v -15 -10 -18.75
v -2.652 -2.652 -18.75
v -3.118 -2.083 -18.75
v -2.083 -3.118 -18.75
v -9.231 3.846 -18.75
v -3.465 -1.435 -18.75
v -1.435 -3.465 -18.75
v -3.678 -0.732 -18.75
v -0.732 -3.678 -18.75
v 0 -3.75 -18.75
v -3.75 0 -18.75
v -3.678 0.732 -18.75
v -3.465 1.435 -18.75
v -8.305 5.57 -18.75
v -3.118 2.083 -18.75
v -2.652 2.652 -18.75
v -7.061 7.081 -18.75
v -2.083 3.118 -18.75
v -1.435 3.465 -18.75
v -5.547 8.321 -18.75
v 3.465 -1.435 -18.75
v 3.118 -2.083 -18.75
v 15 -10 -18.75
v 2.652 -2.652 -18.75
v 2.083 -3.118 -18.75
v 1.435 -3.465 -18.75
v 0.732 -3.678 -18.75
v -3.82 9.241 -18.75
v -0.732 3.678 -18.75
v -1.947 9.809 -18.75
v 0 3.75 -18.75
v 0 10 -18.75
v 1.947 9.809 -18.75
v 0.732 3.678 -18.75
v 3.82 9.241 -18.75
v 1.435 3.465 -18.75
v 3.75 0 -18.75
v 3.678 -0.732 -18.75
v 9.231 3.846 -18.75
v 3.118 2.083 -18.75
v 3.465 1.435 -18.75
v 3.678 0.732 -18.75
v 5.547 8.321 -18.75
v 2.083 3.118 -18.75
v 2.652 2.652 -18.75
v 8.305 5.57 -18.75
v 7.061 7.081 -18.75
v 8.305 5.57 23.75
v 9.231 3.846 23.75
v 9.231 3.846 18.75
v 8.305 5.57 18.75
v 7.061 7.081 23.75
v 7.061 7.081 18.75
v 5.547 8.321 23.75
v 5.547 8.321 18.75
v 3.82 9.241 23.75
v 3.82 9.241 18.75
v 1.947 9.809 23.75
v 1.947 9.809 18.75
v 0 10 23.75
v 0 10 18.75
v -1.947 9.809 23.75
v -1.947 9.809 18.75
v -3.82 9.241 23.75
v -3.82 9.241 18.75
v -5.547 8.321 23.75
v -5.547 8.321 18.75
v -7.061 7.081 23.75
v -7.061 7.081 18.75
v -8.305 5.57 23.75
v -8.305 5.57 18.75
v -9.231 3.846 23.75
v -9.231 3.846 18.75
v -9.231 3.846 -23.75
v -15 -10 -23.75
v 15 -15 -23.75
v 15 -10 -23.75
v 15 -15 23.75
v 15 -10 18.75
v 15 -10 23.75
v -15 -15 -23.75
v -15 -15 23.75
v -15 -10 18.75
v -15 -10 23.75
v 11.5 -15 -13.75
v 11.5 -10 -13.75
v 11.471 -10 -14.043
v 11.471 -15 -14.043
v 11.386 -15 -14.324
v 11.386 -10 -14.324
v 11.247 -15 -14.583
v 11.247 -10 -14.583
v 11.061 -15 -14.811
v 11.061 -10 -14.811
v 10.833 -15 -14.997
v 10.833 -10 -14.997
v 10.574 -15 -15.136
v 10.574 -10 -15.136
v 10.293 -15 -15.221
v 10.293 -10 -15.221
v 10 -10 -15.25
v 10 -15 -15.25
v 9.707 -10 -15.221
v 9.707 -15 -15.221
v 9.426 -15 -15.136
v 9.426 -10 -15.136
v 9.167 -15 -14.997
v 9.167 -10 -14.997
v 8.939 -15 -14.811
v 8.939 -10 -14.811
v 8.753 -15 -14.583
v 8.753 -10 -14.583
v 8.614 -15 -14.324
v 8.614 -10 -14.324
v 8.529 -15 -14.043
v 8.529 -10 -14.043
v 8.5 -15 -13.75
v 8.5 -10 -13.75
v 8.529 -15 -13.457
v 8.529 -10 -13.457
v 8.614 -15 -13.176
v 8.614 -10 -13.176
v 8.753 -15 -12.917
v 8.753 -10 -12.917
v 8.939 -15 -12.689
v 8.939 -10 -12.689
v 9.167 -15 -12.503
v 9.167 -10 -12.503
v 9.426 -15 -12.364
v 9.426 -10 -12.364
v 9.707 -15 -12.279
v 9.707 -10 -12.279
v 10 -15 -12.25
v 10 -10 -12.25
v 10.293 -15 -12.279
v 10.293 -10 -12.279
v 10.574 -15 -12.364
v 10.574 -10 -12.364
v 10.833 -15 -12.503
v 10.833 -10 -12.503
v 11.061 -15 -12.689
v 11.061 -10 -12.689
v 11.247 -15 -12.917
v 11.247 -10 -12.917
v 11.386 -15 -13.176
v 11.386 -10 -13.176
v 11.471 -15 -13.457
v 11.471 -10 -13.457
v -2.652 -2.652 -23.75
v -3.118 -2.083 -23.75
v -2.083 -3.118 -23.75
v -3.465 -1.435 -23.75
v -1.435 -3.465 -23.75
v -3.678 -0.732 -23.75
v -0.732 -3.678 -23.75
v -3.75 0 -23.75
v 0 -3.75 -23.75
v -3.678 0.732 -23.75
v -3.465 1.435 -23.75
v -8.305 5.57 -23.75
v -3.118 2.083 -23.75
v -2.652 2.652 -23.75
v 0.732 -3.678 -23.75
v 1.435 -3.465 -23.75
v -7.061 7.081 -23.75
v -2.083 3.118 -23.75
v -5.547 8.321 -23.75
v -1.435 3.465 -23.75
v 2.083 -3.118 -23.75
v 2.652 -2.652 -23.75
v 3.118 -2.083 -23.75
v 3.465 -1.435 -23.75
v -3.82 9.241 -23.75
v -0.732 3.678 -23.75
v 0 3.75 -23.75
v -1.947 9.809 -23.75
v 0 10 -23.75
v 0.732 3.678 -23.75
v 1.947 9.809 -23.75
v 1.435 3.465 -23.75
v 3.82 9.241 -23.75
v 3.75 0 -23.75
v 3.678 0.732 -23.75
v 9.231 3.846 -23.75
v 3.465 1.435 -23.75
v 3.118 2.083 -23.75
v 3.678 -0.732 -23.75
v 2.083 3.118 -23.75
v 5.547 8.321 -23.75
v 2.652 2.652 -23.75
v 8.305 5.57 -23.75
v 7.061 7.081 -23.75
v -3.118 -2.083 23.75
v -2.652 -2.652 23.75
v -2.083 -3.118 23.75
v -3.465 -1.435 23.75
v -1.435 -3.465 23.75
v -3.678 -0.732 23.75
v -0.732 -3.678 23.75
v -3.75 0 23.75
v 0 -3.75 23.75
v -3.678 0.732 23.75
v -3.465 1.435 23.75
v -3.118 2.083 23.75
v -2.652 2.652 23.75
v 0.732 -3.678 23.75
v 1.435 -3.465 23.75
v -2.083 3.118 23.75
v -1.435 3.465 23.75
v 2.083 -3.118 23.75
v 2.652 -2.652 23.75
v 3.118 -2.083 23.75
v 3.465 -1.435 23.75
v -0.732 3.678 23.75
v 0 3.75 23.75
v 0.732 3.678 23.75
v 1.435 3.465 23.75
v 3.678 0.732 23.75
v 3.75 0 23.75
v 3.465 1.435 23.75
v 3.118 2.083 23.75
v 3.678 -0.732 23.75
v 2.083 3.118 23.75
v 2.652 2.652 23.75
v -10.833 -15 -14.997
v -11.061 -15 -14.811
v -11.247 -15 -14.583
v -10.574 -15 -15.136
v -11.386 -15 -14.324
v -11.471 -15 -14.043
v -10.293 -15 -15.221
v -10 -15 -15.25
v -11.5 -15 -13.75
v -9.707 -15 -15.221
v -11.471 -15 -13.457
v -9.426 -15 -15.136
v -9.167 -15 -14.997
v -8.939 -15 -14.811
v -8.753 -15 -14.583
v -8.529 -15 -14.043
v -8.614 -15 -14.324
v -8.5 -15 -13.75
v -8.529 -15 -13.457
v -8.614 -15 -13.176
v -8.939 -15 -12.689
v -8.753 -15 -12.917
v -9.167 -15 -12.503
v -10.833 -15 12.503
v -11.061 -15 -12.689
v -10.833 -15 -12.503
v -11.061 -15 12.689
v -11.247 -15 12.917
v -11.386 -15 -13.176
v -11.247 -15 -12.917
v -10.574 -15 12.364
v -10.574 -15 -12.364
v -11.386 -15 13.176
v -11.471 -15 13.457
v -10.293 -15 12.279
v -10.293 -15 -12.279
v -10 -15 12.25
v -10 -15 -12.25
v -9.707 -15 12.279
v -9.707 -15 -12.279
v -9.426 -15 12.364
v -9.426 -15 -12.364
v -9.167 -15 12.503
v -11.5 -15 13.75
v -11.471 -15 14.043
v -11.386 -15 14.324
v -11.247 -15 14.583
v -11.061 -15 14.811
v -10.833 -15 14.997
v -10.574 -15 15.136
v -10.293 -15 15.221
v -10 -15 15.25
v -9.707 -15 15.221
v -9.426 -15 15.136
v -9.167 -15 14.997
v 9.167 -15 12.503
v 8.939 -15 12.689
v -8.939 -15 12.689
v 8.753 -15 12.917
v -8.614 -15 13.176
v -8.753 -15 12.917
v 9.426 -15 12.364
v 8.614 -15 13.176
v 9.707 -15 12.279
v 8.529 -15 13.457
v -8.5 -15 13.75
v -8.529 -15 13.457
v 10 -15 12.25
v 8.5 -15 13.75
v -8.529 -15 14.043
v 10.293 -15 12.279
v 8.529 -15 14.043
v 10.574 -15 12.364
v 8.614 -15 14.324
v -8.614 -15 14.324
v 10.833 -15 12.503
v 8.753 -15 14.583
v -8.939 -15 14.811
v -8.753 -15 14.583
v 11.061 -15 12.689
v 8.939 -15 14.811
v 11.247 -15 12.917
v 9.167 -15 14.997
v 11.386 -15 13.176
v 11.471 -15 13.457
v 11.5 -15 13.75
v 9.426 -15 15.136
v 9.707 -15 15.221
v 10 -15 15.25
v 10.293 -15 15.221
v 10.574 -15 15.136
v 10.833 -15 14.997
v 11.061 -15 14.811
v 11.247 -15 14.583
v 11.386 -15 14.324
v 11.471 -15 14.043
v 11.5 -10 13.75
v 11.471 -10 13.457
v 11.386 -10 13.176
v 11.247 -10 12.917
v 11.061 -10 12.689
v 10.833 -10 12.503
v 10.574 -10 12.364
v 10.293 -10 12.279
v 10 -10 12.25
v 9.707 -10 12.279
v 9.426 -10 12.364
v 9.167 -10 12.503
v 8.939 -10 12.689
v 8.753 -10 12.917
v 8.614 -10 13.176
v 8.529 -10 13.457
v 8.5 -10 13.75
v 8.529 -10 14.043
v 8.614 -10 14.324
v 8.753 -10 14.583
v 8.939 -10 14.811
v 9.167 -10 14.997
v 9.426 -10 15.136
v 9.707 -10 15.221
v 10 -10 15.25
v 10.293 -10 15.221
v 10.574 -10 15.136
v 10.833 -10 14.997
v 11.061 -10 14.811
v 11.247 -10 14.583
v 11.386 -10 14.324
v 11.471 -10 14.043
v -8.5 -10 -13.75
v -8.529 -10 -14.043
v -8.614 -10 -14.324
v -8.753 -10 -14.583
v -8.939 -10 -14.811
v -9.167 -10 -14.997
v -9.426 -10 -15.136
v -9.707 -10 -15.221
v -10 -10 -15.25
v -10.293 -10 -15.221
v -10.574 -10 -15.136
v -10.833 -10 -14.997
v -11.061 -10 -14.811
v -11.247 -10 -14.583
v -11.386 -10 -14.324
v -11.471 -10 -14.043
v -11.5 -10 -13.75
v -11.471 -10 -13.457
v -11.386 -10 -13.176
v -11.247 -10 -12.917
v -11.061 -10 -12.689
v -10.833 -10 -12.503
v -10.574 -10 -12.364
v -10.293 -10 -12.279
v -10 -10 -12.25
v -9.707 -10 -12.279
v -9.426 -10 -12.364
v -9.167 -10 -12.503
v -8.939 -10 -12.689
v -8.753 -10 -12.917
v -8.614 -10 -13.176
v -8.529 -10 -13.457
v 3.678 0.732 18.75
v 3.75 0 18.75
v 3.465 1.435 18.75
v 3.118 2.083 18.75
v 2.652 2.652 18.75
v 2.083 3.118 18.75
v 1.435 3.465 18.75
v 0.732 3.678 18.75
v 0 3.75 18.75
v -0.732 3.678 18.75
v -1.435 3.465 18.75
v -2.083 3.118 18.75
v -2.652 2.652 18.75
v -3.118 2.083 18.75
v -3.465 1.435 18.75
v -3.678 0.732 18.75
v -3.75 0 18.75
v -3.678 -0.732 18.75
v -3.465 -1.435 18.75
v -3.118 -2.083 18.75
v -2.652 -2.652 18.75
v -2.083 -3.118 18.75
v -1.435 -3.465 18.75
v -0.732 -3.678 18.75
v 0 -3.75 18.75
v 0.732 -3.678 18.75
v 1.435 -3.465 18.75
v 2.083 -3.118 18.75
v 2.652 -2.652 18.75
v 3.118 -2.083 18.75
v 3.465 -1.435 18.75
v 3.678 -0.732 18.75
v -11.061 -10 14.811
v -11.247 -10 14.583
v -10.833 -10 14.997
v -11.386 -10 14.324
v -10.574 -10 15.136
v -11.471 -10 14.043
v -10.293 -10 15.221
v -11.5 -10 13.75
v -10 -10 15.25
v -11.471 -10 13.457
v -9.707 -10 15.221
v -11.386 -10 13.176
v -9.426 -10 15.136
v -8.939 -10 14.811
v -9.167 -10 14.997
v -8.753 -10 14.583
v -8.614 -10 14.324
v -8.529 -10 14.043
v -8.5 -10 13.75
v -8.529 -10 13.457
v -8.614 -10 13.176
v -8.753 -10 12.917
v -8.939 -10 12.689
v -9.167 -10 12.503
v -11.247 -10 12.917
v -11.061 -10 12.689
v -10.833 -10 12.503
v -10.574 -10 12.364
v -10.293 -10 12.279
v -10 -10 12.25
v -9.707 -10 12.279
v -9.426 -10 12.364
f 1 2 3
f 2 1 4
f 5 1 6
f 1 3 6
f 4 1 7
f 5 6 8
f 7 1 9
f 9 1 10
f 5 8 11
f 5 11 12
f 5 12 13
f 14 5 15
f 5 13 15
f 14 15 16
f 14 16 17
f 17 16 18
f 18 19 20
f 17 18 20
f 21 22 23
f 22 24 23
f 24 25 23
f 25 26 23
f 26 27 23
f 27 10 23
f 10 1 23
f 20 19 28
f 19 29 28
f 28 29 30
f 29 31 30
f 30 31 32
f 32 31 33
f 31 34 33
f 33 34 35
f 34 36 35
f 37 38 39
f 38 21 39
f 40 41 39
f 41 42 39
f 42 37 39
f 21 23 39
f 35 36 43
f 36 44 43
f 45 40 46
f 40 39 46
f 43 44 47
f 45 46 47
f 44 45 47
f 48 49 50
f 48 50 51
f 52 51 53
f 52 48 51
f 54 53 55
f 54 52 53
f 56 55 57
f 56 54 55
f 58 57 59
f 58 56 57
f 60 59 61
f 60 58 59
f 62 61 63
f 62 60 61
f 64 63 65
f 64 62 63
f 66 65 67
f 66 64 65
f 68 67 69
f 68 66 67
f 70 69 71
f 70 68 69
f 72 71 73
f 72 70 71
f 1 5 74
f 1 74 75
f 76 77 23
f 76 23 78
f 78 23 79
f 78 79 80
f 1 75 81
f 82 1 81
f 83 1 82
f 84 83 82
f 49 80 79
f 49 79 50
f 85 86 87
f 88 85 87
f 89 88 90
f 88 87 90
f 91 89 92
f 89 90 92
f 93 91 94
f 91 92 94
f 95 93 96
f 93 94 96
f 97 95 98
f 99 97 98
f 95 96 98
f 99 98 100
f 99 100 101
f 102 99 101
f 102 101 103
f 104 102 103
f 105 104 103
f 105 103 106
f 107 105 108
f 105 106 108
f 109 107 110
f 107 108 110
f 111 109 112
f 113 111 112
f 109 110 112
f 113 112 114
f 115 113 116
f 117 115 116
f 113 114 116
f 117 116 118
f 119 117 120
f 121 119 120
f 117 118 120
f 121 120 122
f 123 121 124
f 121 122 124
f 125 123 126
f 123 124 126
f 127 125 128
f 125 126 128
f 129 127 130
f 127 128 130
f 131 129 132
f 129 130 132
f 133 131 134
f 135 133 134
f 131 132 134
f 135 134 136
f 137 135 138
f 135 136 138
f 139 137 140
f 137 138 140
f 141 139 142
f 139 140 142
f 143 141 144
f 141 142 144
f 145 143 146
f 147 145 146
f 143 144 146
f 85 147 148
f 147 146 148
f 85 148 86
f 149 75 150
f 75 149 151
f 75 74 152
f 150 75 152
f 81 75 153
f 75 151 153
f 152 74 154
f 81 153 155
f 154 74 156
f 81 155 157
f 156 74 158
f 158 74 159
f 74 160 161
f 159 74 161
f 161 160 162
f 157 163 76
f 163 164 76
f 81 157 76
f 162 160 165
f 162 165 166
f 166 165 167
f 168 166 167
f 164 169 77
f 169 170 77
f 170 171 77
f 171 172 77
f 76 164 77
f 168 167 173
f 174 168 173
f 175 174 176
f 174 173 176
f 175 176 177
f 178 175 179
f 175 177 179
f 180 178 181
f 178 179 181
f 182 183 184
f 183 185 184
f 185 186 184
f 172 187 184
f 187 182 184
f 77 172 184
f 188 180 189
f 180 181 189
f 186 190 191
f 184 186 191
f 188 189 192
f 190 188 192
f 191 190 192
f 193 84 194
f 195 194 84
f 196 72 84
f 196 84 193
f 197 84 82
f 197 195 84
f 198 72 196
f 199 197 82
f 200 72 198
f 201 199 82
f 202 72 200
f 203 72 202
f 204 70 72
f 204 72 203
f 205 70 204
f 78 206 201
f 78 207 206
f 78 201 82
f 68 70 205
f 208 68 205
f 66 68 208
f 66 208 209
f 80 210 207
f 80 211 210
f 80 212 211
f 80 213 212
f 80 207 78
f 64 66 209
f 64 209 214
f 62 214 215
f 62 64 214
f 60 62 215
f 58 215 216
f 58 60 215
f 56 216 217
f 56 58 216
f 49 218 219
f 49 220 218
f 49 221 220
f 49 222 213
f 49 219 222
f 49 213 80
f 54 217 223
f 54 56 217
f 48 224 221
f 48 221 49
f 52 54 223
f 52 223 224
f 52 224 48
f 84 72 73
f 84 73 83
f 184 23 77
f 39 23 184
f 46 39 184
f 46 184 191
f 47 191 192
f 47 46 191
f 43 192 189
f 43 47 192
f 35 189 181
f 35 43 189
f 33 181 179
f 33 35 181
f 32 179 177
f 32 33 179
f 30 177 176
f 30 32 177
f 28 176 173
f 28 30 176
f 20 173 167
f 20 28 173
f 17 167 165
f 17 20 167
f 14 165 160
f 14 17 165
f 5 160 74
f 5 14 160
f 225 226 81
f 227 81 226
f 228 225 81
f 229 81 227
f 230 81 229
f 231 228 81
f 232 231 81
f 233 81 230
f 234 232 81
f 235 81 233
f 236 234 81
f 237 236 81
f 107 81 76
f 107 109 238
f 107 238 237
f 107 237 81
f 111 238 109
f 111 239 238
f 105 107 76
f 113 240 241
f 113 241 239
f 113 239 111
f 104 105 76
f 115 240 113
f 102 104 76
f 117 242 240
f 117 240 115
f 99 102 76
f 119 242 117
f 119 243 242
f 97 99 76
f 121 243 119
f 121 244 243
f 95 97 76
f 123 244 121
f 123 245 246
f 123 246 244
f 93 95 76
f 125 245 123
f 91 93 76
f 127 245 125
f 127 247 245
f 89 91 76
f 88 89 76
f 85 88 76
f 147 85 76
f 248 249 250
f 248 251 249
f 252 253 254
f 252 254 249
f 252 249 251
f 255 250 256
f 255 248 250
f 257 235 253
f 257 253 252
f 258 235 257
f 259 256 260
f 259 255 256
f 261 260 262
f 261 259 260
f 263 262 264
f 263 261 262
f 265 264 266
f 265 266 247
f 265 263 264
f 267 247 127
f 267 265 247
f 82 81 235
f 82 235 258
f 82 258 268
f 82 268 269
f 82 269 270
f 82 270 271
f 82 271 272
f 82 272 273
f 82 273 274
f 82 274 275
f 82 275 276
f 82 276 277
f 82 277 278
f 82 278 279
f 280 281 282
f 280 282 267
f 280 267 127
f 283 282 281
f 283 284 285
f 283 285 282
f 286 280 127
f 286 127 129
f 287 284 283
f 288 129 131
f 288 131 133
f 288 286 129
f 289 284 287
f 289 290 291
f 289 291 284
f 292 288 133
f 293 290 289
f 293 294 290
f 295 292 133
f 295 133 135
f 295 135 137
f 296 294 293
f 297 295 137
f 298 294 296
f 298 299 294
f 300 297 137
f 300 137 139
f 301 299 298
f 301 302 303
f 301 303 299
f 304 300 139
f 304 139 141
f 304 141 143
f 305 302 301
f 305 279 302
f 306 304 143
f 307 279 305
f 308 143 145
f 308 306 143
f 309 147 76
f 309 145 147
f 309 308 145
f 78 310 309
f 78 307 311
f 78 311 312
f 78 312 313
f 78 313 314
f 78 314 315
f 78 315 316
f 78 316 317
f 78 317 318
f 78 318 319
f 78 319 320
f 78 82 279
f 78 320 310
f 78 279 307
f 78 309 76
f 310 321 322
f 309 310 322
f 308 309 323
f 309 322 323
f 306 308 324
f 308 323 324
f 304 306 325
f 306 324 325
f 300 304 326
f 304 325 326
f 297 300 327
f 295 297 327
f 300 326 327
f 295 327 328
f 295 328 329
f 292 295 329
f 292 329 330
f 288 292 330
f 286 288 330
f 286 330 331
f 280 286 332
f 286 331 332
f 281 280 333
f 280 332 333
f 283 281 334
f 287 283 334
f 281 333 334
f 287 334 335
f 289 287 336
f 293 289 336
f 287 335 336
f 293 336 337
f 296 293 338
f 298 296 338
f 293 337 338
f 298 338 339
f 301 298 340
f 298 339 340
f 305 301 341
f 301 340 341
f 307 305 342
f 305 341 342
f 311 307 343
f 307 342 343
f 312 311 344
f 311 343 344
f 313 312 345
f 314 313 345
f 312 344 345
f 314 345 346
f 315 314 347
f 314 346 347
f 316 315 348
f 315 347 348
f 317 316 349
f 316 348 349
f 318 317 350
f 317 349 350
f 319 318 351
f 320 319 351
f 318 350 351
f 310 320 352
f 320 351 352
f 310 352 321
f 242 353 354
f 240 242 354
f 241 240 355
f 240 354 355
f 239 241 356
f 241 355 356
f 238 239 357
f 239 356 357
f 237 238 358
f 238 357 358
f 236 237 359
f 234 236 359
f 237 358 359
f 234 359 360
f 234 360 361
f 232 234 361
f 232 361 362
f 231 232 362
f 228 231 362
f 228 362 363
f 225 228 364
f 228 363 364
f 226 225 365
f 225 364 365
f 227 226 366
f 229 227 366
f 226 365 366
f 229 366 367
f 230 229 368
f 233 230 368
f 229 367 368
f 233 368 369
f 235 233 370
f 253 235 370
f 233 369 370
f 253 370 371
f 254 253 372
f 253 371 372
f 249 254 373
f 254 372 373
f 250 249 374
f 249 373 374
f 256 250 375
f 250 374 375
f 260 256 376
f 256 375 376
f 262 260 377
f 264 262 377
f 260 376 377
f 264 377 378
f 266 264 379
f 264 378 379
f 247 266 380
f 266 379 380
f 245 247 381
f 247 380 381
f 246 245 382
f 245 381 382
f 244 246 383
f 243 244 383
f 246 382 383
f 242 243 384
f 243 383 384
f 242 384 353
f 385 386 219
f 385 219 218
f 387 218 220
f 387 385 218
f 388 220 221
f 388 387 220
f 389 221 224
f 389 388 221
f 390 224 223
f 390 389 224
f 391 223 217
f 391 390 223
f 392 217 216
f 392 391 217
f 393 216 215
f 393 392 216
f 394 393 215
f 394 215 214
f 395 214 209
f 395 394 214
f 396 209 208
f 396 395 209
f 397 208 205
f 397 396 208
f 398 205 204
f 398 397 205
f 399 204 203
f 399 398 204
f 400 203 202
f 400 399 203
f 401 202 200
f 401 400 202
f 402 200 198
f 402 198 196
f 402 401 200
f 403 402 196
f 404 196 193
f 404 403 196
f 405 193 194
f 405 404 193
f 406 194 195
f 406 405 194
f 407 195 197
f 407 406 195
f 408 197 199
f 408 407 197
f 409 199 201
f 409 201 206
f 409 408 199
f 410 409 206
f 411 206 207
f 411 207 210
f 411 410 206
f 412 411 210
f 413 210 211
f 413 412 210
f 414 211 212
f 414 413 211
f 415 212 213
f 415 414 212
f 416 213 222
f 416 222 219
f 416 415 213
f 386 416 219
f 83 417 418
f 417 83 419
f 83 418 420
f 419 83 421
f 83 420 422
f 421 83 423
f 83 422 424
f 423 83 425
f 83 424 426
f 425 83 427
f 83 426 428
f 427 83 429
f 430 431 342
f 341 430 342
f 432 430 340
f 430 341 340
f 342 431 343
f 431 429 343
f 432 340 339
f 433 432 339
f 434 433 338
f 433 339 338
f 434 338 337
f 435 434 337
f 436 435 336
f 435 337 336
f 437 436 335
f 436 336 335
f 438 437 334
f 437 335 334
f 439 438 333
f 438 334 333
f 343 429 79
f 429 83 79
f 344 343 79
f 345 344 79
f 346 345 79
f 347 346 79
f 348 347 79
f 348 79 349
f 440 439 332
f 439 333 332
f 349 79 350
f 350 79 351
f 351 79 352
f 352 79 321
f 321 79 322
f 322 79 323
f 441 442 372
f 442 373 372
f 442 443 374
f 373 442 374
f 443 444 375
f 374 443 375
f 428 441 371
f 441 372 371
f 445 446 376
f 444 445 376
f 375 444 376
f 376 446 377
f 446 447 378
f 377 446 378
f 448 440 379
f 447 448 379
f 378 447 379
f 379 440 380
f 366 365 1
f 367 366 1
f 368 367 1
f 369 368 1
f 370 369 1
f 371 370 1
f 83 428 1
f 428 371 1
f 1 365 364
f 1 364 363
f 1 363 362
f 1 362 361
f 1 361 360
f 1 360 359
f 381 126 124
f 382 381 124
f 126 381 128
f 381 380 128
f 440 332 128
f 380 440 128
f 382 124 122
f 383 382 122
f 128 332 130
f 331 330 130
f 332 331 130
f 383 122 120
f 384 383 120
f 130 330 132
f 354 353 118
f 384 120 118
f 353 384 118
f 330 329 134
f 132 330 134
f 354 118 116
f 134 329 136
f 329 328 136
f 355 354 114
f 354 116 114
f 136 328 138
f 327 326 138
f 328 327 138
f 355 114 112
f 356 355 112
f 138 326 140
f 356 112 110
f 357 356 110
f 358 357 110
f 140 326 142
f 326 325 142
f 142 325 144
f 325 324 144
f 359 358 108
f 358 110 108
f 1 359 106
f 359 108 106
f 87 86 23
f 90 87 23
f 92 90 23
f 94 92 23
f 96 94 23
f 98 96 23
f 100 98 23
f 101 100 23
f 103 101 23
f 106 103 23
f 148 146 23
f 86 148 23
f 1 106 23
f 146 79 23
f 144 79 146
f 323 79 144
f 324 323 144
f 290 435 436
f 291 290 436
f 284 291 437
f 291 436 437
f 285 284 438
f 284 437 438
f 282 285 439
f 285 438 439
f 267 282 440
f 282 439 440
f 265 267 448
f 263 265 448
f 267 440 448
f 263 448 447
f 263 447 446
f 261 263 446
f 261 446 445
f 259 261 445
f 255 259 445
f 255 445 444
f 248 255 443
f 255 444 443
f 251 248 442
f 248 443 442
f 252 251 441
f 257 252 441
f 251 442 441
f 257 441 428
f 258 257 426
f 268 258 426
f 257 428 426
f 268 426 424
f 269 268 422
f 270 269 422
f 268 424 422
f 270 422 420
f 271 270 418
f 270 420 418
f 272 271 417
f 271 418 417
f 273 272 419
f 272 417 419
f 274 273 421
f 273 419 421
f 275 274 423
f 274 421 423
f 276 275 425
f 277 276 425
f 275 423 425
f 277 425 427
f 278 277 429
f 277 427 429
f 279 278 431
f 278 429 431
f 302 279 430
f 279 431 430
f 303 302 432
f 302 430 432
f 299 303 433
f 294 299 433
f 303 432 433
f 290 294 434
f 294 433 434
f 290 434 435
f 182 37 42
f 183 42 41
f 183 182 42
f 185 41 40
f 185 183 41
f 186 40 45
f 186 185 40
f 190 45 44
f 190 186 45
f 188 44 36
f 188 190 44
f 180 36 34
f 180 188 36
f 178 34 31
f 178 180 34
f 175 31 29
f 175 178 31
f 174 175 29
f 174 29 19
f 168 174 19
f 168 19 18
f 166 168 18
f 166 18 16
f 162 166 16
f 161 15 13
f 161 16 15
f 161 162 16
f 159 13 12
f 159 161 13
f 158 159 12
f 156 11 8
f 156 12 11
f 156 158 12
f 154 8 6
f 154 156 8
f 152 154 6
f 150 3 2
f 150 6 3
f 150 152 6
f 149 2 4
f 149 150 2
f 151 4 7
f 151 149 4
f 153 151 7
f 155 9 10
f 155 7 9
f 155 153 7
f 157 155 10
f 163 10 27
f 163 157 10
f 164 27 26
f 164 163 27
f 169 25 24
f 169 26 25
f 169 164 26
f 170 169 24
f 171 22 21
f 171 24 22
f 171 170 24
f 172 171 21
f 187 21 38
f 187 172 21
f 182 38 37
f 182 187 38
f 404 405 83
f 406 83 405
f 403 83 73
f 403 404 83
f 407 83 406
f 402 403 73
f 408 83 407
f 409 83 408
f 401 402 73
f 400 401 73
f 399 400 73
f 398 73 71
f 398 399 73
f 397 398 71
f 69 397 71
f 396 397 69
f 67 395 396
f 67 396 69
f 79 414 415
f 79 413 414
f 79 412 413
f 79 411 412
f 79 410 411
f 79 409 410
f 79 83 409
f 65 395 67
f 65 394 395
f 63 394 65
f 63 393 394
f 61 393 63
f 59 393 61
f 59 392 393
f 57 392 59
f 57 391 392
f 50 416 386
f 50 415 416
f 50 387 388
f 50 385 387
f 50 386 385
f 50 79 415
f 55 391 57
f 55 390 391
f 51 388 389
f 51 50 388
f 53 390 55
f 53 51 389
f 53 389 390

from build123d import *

# Parameters (mm, degrees)
SKETCH1_R           = 3.75
BOSS_EXTRUDE1_DEPTH = 23.75
SKETCH2_W           = 30
SKETCH2_H           = 47.5
BOSS_EXTRUDE2_DEPTH = 5
SKETCH3_W           = 37.5
SKETCH3_H           = 21.575563825
CUT_EXTRUDE1_DEPTH  = 30
SKETCH4_R           = 1.5
CUT_EXTRUDE2_DEPTH  = 5


with BuildPart() as part:
    # Sketch1 → Boss-Extrude1 (new body, symmetric)
    with BuildSketch(Plane.XY):
        with BuildLine():
            Line((-15, -10), (15, -10))
            Line((15, -10), (9.230769231, 3.846153846))
            ThreePointArc((9.230769231, 3.846153846), (0, 10), (-9.230769231, 3.846153846))
            Line((-9.230769231, 3.846153846), (-15, -10))
        make_face()
        Circle(SKETCH1_R, mode=Mode.SUBTRACT)
    extrude(amount=BOSS_EXTRUDE1_DEPTH, both=True)

    # Sketch2 → Boss-Extrude2 (add)
    with BuildSketch(Plane.XZ.offset(10)):
        Rectangle(SKETCH2_W, SKETCH2_H)
    extrude(amount=BOSS_EXTRUDE2_DEPTH)

    # Sketch3 → Cut-Extrude1 (cut)
    with BuildSketch(Plane(origin=(15, 0, 0), x_dir=(0, 0, -1), z_dir=(1, 0, 0))):
        with Locations((0, 0.787781913)):
            Rectangle(SKETCH3_W, SKETCH3_H)
    extrude(amount=-CUT_EXTRUDE1_DEPTH, mode=Mode.SUBTRACT)

    # Sketch4 → Cut-Extrude2 (cut)
    with BuildSketch(Plane(origin=(0, -10, 0), x_dir=(1, 0, 0), z_dir=(0, 1, 0))):
        with Locations((-10, 13.75)):
            Circle(SKETCH4_R)
        with Locations((10, -13.75)):
            Circle(SKETCH4_R)
        with Locations((-10, -13.75)):
            Circle(SKETCH4_R)
        with Locations((10, 13.75)):
            Circle(SKETCH4_R)
    extrude(amount=-CUT_EXTRUDE2_DEPTH, mode=Mode.SUBTRACT)


solid = part.part
